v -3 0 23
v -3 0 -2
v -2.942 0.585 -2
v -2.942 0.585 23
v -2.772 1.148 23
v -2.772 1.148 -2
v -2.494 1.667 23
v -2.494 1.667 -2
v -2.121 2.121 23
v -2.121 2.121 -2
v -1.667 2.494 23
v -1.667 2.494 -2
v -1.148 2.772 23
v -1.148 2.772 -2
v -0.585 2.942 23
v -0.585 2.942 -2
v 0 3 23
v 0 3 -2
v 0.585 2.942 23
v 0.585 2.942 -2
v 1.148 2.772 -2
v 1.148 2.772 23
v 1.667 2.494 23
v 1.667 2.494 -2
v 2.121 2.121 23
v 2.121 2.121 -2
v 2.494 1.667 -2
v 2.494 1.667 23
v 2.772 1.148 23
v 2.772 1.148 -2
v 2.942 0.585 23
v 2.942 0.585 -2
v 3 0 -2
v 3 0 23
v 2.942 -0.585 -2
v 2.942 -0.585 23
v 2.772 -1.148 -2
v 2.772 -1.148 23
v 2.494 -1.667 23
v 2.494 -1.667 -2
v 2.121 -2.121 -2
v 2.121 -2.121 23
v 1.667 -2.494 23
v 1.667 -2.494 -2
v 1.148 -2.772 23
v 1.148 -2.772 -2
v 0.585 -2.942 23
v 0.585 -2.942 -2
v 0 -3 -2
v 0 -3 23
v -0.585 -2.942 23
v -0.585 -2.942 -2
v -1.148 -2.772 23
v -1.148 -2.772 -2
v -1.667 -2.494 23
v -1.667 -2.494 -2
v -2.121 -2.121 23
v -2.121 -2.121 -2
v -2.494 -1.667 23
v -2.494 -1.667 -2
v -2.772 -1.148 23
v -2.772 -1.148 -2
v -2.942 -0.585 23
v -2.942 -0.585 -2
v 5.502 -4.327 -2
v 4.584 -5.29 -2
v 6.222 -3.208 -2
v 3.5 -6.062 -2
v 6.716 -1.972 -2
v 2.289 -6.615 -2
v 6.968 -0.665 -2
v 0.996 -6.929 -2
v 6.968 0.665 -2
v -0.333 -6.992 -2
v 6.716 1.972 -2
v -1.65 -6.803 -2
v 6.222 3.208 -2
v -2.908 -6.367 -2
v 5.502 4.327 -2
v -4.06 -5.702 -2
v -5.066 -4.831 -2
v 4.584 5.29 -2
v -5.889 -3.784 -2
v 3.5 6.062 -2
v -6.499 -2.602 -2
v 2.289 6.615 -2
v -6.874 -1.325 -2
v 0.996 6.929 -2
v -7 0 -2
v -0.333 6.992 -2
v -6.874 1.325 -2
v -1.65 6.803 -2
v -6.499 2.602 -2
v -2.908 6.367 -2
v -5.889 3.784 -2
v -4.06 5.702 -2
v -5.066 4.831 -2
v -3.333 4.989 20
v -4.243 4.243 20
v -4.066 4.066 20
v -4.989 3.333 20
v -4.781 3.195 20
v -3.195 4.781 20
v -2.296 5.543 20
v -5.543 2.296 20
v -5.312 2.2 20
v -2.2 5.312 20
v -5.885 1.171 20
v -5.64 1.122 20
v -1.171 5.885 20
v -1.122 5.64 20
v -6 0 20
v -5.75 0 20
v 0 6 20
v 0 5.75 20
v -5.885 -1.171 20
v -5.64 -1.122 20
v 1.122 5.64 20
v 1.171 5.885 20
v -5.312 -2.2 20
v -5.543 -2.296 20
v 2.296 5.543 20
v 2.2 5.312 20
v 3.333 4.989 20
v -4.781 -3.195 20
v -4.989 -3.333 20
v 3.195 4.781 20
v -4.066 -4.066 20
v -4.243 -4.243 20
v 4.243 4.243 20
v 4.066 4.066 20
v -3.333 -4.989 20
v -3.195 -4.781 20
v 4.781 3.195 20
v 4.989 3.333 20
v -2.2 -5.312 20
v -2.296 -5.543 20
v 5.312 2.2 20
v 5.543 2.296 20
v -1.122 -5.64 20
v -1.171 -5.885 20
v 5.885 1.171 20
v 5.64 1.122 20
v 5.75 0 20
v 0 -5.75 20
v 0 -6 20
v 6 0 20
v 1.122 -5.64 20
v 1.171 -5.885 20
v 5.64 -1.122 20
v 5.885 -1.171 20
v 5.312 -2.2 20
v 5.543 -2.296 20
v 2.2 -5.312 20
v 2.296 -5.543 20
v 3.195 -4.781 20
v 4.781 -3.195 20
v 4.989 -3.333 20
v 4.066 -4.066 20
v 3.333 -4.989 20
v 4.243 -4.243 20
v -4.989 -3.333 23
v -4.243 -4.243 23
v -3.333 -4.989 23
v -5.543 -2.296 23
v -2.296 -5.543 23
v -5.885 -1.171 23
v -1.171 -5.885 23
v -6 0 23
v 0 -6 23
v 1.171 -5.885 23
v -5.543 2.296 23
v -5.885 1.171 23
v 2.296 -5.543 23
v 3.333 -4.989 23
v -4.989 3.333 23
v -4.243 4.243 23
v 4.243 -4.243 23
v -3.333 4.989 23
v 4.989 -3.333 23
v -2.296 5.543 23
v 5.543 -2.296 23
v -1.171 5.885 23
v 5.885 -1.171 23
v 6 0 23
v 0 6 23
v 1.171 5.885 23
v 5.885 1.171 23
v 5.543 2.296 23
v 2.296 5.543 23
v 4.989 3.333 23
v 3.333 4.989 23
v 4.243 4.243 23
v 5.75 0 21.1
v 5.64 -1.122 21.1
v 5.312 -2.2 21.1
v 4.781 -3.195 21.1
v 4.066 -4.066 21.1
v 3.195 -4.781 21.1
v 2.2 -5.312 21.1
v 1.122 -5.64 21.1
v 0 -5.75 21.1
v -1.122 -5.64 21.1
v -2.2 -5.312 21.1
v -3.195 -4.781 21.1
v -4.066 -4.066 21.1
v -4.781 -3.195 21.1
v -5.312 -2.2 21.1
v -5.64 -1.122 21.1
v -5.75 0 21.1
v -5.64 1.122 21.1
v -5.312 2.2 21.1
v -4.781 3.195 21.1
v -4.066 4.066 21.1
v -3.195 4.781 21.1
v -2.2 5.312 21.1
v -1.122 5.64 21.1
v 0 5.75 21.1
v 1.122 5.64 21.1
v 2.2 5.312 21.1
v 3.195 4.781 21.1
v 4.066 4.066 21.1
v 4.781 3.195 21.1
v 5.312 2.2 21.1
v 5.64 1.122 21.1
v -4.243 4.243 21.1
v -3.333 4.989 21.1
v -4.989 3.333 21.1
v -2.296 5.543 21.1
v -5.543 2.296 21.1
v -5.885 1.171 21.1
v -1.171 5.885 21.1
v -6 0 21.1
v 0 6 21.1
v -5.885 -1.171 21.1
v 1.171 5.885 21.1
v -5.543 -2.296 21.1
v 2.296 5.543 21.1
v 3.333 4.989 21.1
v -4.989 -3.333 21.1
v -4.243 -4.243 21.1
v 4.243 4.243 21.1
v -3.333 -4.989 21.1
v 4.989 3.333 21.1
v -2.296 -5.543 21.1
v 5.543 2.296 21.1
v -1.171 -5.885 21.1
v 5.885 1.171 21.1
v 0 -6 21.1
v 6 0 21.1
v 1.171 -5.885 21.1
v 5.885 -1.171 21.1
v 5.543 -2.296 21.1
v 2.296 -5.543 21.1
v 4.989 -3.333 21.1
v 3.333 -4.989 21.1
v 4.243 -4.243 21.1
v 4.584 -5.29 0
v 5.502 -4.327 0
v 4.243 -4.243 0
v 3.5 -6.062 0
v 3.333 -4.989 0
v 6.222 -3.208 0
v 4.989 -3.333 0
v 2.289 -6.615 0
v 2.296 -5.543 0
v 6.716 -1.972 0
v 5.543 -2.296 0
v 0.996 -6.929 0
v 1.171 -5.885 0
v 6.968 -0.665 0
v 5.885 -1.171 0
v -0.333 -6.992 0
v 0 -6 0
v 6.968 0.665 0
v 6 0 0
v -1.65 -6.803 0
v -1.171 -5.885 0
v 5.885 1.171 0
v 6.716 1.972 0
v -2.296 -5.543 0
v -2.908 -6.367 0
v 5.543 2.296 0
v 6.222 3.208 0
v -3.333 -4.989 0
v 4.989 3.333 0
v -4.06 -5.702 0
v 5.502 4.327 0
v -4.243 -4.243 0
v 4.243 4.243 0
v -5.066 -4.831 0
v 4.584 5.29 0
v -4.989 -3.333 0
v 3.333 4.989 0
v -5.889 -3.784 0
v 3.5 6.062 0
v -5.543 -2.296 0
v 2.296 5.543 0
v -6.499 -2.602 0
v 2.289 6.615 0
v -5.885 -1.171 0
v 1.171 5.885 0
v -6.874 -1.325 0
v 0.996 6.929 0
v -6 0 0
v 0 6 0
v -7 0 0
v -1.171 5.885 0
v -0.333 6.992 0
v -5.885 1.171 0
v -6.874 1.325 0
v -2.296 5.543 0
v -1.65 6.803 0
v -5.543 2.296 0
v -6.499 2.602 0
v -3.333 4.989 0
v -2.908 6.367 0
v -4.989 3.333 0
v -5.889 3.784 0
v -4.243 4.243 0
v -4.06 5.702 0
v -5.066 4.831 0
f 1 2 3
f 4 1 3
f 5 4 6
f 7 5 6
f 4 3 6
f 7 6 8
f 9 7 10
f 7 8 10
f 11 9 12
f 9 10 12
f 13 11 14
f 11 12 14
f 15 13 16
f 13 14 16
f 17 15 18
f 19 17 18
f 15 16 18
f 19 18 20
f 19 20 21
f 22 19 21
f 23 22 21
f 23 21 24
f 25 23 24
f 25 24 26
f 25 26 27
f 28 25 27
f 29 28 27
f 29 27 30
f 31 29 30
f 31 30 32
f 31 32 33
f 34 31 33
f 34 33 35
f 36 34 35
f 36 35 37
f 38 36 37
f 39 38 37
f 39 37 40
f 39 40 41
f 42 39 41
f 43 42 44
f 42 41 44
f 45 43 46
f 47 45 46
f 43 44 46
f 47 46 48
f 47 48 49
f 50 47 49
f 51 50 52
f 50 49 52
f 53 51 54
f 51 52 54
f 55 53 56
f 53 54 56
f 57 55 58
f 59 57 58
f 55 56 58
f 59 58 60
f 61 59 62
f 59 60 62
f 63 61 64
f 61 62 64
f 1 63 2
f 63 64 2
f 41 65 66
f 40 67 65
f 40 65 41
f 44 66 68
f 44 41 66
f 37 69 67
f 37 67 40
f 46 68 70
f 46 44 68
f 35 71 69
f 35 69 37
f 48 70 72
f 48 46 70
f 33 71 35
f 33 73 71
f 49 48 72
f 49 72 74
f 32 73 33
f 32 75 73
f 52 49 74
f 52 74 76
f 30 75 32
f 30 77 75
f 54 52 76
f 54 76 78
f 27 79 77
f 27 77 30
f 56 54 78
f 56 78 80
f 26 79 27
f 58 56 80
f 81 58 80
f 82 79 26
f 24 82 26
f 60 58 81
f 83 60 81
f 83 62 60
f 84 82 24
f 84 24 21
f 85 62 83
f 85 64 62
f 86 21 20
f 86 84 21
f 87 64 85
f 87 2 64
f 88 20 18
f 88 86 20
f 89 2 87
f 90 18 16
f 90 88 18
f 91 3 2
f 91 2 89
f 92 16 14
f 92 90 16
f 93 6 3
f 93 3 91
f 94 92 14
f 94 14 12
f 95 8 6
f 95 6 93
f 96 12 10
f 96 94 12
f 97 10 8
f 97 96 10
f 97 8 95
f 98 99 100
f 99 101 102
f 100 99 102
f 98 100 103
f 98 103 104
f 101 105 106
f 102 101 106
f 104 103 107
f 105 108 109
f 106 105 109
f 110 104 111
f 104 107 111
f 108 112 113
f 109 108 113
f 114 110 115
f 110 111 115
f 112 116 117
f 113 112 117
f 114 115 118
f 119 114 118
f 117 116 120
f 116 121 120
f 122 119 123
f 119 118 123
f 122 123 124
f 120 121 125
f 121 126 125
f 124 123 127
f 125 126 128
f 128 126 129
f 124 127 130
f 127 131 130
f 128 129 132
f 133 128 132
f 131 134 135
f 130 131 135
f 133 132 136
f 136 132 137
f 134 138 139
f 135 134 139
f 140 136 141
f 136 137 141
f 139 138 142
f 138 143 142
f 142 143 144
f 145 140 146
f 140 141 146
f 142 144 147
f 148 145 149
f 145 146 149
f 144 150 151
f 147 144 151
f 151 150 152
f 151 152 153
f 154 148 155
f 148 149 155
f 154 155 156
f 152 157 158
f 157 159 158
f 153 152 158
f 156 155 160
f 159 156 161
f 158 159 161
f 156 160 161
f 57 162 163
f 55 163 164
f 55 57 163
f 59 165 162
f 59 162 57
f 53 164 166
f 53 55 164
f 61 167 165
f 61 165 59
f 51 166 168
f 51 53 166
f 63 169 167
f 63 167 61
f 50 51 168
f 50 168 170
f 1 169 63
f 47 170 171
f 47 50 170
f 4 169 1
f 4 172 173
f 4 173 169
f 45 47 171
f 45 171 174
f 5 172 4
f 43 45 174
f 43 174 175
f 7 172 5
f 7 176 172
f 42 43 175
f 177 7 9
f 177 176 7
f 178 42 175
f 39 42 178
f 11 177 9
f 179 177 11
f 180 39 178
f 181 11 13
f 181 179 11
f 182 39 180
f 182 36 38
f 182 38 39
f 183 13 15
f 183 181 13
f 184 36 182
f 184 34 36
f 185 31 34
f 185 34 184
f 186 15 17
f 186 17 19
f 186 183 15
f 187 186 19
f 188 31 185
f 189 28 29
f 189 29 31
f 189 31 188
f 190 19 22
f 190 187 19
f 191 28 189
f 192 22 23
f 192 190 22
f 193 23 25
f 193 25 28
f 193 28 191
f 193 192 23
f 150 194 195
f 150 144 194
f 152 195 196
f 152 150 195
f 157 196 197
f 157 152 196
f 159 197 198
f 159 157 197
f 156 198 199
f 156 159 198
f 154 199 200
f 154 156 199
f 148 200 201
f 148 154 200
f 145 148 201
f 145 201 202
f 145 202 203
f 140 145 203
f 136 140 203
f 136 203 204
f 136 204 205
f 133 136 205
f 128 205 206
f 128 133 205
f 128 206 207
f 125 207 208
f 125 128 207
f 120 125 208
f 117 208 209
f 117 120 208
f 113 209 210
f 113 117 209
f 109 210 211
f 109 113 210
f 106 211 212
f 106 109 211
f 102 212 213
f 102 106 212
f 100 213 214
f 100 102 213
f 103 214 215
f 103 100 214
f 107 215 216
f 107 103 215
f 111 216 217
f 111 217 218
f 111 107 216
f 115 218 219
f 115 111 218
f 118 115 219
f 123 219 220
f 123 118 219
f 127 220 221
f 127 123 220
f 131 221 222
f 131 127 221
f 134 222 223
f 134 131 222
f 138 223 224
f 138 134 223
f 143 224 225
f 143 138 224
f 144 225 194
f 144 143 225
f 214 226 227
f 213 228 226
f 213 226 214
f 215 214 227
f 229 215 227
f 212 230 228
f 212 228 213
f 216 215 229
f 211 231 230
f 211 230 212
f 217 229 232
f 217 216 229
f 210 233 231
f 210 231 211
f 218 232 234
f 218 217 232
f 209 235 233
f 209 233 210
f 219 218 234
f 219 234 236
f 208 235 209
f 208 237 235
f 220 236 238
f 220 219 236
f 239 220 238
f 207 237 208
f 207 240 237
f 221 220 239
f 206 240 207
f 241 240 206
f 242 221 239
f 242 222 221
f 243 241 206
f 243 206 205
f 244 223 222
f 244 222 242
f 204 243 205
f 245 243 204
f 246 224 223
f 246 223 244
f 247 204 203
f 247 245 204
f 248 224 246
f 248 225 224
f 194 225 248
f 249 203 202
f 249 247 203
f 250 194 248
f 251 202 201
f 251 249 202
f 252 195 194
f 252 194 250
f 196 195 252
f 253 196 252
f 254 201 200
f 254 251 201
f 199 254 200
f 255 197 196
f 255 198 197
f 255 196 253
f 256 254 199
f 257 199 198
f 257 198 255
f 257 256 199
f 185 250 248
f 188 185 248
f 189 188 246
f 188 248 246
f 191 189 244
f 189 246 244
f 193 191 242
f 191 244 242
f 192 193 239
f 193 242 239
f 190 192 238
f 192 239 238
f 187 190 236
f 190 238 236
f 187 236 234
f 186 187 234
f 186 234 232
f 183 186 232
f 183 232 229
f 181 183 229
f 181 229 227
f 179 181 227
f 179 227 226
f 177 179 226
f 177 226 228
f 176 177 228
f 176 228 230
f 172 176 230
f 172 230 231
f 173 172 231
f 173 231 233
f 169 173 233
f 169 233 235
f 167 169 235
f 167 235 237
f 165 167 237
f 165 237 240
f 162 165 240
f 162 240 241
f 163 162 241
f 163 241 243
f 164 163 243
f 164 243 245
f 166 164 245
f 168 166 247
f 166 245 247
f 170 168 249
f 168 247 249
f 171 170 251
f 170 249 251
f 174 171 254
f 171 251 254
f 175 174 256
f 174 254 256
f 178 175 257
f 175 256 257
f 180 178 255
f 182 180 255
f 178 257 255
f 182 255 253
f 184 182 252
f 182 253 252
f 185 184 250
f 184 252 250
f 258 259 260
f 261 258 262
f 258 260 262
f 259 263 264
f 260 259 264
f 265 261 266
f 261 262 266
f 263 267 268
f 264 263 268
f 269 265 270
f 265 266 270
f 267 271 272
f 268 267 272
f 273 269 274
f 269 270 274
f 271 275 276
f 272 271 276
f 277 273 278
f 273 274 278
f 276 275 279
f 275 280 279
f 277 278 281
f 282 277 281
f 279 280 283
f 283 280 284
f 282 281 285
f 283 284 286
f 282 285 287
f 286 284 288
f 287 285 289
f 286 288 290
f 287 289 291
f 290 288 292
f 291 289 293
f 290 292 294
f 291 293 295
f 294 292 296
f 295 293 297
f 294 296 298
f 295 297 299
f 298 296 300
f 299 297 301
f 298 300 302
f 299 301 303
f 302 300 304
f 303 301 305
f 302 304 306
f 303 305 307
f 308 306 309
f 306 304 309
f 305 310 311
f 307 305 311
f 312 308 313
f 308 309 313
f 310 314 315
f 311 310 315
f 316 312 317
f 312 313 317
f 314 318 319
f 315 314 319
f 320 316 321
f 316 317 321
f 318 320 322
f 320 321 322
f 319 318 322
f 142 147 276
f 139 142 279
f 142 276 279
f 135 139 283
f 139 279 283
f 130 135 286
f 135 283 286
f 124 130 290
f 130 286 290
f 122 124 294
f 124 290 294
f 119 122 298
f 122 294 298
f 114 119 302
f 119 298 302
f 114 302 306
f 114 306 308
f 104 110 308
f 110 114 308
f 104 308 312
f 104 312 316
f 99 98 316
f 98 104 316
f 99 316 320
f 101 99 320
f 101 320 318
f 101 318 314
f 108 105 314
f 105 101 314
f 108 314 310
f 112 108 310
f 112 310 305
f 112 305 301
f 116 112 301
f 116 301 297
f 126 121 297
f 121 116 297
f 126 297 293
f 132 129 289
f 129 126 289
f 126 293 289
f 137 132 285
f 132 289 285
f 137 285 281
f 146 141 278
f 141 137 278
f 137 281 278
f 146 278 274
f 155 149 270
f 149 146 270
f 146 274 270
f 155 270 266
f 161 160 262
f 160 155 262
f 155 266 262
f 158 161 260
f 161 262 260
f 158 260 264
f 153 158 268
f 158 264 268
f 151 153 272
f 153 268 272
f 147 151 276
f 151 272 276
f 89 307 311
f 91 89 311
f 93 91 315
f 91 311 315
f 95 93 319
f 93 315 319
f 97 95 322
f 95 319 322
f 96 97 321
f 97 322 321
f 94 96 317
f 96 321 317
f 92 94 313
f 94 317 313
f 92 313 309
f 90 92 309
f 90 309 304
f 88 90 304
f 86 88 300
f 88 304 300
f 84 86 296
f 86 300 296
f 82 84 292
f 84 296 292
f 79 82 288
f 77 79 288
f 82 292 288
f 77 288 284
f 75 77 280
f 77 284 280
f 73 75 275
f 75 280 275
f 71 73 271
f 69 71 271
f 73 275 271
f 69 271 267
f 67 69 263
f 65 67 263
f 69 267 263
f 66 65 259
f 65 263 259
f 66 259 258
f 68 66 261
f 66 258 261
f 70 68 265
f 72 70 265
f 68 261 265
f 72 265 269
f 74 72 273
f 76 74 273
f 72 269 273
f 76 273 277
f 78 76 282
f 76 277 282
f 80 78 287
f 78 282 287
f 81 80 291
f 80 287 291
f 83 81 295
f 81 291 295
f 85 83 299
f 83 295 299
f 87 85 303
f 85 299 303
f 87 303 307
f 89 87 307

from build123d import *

# Parameters (mm, degrees)
SKETCH_1_R          = 6
EXTRUDE_1_DEPTH     = 23
SKETCH_2_R          = 7
EXTRUDE_2_DEPTH     = 2
SKETCH_3_W          = 0.25
SKETCH_3_H          = 1.1
SKETCH_4_R          = 3
CUT_EXTRUDE_1_DEPTH = 27


with BuildPart() as part:
    # 草图1 → 凸台-拉伸1 (new body)
    with BuildSketch(Plane.XY):
        Circle(SKETCH_1_R)
    extrude(amount=EXTRUDE_1_DEPTH)

    # 草图2 → 凸台-拉伸2 (add)
    with BuildSketch(Plane(origin=(0, 0, 0), x_dir=(-1, 0, 0), z_dir=(0, 0, -1))):
        Circle(SKETCH_2_R)
    extrude(amount=EXTRUDE_2_DEPTH)

    # 草图3 → 切除-旋转1 (revolve, cut)
    with BuildSketch(Plane(origin=(0, 0, 0), x_dir=(1, 0, 0), z_dir=(0, 1, 0)), mode=Mode.PRIVATE) as cut_revolve_1_sk:
        with Locations((-5.875, -20.55)):
            Rectangle(SKETCH_3_W, SKETCH_3_H)
    revolve(cut_revolve_1_sk.sketch.rotate(Axis((0, 0, 23), (0, 0, -1)), 180), axis=Axis((0, 0, 23), (0, 0, -1)), mode=Mode.SUBTRACT)

    # 草图4 → 切除-拉伸1 (cut)
    with BuildSketch(Plane(origin=(0, 0, -2), x_dir=(-1, 0, 0), z_dir=(0, 0, -1))):
        Circle(SKETCH_4_R)
    extrude(amount=-CUT_EXTRUDE_1_DEPTH, mode=Mode.SUBTRACT)


solid = part.part
